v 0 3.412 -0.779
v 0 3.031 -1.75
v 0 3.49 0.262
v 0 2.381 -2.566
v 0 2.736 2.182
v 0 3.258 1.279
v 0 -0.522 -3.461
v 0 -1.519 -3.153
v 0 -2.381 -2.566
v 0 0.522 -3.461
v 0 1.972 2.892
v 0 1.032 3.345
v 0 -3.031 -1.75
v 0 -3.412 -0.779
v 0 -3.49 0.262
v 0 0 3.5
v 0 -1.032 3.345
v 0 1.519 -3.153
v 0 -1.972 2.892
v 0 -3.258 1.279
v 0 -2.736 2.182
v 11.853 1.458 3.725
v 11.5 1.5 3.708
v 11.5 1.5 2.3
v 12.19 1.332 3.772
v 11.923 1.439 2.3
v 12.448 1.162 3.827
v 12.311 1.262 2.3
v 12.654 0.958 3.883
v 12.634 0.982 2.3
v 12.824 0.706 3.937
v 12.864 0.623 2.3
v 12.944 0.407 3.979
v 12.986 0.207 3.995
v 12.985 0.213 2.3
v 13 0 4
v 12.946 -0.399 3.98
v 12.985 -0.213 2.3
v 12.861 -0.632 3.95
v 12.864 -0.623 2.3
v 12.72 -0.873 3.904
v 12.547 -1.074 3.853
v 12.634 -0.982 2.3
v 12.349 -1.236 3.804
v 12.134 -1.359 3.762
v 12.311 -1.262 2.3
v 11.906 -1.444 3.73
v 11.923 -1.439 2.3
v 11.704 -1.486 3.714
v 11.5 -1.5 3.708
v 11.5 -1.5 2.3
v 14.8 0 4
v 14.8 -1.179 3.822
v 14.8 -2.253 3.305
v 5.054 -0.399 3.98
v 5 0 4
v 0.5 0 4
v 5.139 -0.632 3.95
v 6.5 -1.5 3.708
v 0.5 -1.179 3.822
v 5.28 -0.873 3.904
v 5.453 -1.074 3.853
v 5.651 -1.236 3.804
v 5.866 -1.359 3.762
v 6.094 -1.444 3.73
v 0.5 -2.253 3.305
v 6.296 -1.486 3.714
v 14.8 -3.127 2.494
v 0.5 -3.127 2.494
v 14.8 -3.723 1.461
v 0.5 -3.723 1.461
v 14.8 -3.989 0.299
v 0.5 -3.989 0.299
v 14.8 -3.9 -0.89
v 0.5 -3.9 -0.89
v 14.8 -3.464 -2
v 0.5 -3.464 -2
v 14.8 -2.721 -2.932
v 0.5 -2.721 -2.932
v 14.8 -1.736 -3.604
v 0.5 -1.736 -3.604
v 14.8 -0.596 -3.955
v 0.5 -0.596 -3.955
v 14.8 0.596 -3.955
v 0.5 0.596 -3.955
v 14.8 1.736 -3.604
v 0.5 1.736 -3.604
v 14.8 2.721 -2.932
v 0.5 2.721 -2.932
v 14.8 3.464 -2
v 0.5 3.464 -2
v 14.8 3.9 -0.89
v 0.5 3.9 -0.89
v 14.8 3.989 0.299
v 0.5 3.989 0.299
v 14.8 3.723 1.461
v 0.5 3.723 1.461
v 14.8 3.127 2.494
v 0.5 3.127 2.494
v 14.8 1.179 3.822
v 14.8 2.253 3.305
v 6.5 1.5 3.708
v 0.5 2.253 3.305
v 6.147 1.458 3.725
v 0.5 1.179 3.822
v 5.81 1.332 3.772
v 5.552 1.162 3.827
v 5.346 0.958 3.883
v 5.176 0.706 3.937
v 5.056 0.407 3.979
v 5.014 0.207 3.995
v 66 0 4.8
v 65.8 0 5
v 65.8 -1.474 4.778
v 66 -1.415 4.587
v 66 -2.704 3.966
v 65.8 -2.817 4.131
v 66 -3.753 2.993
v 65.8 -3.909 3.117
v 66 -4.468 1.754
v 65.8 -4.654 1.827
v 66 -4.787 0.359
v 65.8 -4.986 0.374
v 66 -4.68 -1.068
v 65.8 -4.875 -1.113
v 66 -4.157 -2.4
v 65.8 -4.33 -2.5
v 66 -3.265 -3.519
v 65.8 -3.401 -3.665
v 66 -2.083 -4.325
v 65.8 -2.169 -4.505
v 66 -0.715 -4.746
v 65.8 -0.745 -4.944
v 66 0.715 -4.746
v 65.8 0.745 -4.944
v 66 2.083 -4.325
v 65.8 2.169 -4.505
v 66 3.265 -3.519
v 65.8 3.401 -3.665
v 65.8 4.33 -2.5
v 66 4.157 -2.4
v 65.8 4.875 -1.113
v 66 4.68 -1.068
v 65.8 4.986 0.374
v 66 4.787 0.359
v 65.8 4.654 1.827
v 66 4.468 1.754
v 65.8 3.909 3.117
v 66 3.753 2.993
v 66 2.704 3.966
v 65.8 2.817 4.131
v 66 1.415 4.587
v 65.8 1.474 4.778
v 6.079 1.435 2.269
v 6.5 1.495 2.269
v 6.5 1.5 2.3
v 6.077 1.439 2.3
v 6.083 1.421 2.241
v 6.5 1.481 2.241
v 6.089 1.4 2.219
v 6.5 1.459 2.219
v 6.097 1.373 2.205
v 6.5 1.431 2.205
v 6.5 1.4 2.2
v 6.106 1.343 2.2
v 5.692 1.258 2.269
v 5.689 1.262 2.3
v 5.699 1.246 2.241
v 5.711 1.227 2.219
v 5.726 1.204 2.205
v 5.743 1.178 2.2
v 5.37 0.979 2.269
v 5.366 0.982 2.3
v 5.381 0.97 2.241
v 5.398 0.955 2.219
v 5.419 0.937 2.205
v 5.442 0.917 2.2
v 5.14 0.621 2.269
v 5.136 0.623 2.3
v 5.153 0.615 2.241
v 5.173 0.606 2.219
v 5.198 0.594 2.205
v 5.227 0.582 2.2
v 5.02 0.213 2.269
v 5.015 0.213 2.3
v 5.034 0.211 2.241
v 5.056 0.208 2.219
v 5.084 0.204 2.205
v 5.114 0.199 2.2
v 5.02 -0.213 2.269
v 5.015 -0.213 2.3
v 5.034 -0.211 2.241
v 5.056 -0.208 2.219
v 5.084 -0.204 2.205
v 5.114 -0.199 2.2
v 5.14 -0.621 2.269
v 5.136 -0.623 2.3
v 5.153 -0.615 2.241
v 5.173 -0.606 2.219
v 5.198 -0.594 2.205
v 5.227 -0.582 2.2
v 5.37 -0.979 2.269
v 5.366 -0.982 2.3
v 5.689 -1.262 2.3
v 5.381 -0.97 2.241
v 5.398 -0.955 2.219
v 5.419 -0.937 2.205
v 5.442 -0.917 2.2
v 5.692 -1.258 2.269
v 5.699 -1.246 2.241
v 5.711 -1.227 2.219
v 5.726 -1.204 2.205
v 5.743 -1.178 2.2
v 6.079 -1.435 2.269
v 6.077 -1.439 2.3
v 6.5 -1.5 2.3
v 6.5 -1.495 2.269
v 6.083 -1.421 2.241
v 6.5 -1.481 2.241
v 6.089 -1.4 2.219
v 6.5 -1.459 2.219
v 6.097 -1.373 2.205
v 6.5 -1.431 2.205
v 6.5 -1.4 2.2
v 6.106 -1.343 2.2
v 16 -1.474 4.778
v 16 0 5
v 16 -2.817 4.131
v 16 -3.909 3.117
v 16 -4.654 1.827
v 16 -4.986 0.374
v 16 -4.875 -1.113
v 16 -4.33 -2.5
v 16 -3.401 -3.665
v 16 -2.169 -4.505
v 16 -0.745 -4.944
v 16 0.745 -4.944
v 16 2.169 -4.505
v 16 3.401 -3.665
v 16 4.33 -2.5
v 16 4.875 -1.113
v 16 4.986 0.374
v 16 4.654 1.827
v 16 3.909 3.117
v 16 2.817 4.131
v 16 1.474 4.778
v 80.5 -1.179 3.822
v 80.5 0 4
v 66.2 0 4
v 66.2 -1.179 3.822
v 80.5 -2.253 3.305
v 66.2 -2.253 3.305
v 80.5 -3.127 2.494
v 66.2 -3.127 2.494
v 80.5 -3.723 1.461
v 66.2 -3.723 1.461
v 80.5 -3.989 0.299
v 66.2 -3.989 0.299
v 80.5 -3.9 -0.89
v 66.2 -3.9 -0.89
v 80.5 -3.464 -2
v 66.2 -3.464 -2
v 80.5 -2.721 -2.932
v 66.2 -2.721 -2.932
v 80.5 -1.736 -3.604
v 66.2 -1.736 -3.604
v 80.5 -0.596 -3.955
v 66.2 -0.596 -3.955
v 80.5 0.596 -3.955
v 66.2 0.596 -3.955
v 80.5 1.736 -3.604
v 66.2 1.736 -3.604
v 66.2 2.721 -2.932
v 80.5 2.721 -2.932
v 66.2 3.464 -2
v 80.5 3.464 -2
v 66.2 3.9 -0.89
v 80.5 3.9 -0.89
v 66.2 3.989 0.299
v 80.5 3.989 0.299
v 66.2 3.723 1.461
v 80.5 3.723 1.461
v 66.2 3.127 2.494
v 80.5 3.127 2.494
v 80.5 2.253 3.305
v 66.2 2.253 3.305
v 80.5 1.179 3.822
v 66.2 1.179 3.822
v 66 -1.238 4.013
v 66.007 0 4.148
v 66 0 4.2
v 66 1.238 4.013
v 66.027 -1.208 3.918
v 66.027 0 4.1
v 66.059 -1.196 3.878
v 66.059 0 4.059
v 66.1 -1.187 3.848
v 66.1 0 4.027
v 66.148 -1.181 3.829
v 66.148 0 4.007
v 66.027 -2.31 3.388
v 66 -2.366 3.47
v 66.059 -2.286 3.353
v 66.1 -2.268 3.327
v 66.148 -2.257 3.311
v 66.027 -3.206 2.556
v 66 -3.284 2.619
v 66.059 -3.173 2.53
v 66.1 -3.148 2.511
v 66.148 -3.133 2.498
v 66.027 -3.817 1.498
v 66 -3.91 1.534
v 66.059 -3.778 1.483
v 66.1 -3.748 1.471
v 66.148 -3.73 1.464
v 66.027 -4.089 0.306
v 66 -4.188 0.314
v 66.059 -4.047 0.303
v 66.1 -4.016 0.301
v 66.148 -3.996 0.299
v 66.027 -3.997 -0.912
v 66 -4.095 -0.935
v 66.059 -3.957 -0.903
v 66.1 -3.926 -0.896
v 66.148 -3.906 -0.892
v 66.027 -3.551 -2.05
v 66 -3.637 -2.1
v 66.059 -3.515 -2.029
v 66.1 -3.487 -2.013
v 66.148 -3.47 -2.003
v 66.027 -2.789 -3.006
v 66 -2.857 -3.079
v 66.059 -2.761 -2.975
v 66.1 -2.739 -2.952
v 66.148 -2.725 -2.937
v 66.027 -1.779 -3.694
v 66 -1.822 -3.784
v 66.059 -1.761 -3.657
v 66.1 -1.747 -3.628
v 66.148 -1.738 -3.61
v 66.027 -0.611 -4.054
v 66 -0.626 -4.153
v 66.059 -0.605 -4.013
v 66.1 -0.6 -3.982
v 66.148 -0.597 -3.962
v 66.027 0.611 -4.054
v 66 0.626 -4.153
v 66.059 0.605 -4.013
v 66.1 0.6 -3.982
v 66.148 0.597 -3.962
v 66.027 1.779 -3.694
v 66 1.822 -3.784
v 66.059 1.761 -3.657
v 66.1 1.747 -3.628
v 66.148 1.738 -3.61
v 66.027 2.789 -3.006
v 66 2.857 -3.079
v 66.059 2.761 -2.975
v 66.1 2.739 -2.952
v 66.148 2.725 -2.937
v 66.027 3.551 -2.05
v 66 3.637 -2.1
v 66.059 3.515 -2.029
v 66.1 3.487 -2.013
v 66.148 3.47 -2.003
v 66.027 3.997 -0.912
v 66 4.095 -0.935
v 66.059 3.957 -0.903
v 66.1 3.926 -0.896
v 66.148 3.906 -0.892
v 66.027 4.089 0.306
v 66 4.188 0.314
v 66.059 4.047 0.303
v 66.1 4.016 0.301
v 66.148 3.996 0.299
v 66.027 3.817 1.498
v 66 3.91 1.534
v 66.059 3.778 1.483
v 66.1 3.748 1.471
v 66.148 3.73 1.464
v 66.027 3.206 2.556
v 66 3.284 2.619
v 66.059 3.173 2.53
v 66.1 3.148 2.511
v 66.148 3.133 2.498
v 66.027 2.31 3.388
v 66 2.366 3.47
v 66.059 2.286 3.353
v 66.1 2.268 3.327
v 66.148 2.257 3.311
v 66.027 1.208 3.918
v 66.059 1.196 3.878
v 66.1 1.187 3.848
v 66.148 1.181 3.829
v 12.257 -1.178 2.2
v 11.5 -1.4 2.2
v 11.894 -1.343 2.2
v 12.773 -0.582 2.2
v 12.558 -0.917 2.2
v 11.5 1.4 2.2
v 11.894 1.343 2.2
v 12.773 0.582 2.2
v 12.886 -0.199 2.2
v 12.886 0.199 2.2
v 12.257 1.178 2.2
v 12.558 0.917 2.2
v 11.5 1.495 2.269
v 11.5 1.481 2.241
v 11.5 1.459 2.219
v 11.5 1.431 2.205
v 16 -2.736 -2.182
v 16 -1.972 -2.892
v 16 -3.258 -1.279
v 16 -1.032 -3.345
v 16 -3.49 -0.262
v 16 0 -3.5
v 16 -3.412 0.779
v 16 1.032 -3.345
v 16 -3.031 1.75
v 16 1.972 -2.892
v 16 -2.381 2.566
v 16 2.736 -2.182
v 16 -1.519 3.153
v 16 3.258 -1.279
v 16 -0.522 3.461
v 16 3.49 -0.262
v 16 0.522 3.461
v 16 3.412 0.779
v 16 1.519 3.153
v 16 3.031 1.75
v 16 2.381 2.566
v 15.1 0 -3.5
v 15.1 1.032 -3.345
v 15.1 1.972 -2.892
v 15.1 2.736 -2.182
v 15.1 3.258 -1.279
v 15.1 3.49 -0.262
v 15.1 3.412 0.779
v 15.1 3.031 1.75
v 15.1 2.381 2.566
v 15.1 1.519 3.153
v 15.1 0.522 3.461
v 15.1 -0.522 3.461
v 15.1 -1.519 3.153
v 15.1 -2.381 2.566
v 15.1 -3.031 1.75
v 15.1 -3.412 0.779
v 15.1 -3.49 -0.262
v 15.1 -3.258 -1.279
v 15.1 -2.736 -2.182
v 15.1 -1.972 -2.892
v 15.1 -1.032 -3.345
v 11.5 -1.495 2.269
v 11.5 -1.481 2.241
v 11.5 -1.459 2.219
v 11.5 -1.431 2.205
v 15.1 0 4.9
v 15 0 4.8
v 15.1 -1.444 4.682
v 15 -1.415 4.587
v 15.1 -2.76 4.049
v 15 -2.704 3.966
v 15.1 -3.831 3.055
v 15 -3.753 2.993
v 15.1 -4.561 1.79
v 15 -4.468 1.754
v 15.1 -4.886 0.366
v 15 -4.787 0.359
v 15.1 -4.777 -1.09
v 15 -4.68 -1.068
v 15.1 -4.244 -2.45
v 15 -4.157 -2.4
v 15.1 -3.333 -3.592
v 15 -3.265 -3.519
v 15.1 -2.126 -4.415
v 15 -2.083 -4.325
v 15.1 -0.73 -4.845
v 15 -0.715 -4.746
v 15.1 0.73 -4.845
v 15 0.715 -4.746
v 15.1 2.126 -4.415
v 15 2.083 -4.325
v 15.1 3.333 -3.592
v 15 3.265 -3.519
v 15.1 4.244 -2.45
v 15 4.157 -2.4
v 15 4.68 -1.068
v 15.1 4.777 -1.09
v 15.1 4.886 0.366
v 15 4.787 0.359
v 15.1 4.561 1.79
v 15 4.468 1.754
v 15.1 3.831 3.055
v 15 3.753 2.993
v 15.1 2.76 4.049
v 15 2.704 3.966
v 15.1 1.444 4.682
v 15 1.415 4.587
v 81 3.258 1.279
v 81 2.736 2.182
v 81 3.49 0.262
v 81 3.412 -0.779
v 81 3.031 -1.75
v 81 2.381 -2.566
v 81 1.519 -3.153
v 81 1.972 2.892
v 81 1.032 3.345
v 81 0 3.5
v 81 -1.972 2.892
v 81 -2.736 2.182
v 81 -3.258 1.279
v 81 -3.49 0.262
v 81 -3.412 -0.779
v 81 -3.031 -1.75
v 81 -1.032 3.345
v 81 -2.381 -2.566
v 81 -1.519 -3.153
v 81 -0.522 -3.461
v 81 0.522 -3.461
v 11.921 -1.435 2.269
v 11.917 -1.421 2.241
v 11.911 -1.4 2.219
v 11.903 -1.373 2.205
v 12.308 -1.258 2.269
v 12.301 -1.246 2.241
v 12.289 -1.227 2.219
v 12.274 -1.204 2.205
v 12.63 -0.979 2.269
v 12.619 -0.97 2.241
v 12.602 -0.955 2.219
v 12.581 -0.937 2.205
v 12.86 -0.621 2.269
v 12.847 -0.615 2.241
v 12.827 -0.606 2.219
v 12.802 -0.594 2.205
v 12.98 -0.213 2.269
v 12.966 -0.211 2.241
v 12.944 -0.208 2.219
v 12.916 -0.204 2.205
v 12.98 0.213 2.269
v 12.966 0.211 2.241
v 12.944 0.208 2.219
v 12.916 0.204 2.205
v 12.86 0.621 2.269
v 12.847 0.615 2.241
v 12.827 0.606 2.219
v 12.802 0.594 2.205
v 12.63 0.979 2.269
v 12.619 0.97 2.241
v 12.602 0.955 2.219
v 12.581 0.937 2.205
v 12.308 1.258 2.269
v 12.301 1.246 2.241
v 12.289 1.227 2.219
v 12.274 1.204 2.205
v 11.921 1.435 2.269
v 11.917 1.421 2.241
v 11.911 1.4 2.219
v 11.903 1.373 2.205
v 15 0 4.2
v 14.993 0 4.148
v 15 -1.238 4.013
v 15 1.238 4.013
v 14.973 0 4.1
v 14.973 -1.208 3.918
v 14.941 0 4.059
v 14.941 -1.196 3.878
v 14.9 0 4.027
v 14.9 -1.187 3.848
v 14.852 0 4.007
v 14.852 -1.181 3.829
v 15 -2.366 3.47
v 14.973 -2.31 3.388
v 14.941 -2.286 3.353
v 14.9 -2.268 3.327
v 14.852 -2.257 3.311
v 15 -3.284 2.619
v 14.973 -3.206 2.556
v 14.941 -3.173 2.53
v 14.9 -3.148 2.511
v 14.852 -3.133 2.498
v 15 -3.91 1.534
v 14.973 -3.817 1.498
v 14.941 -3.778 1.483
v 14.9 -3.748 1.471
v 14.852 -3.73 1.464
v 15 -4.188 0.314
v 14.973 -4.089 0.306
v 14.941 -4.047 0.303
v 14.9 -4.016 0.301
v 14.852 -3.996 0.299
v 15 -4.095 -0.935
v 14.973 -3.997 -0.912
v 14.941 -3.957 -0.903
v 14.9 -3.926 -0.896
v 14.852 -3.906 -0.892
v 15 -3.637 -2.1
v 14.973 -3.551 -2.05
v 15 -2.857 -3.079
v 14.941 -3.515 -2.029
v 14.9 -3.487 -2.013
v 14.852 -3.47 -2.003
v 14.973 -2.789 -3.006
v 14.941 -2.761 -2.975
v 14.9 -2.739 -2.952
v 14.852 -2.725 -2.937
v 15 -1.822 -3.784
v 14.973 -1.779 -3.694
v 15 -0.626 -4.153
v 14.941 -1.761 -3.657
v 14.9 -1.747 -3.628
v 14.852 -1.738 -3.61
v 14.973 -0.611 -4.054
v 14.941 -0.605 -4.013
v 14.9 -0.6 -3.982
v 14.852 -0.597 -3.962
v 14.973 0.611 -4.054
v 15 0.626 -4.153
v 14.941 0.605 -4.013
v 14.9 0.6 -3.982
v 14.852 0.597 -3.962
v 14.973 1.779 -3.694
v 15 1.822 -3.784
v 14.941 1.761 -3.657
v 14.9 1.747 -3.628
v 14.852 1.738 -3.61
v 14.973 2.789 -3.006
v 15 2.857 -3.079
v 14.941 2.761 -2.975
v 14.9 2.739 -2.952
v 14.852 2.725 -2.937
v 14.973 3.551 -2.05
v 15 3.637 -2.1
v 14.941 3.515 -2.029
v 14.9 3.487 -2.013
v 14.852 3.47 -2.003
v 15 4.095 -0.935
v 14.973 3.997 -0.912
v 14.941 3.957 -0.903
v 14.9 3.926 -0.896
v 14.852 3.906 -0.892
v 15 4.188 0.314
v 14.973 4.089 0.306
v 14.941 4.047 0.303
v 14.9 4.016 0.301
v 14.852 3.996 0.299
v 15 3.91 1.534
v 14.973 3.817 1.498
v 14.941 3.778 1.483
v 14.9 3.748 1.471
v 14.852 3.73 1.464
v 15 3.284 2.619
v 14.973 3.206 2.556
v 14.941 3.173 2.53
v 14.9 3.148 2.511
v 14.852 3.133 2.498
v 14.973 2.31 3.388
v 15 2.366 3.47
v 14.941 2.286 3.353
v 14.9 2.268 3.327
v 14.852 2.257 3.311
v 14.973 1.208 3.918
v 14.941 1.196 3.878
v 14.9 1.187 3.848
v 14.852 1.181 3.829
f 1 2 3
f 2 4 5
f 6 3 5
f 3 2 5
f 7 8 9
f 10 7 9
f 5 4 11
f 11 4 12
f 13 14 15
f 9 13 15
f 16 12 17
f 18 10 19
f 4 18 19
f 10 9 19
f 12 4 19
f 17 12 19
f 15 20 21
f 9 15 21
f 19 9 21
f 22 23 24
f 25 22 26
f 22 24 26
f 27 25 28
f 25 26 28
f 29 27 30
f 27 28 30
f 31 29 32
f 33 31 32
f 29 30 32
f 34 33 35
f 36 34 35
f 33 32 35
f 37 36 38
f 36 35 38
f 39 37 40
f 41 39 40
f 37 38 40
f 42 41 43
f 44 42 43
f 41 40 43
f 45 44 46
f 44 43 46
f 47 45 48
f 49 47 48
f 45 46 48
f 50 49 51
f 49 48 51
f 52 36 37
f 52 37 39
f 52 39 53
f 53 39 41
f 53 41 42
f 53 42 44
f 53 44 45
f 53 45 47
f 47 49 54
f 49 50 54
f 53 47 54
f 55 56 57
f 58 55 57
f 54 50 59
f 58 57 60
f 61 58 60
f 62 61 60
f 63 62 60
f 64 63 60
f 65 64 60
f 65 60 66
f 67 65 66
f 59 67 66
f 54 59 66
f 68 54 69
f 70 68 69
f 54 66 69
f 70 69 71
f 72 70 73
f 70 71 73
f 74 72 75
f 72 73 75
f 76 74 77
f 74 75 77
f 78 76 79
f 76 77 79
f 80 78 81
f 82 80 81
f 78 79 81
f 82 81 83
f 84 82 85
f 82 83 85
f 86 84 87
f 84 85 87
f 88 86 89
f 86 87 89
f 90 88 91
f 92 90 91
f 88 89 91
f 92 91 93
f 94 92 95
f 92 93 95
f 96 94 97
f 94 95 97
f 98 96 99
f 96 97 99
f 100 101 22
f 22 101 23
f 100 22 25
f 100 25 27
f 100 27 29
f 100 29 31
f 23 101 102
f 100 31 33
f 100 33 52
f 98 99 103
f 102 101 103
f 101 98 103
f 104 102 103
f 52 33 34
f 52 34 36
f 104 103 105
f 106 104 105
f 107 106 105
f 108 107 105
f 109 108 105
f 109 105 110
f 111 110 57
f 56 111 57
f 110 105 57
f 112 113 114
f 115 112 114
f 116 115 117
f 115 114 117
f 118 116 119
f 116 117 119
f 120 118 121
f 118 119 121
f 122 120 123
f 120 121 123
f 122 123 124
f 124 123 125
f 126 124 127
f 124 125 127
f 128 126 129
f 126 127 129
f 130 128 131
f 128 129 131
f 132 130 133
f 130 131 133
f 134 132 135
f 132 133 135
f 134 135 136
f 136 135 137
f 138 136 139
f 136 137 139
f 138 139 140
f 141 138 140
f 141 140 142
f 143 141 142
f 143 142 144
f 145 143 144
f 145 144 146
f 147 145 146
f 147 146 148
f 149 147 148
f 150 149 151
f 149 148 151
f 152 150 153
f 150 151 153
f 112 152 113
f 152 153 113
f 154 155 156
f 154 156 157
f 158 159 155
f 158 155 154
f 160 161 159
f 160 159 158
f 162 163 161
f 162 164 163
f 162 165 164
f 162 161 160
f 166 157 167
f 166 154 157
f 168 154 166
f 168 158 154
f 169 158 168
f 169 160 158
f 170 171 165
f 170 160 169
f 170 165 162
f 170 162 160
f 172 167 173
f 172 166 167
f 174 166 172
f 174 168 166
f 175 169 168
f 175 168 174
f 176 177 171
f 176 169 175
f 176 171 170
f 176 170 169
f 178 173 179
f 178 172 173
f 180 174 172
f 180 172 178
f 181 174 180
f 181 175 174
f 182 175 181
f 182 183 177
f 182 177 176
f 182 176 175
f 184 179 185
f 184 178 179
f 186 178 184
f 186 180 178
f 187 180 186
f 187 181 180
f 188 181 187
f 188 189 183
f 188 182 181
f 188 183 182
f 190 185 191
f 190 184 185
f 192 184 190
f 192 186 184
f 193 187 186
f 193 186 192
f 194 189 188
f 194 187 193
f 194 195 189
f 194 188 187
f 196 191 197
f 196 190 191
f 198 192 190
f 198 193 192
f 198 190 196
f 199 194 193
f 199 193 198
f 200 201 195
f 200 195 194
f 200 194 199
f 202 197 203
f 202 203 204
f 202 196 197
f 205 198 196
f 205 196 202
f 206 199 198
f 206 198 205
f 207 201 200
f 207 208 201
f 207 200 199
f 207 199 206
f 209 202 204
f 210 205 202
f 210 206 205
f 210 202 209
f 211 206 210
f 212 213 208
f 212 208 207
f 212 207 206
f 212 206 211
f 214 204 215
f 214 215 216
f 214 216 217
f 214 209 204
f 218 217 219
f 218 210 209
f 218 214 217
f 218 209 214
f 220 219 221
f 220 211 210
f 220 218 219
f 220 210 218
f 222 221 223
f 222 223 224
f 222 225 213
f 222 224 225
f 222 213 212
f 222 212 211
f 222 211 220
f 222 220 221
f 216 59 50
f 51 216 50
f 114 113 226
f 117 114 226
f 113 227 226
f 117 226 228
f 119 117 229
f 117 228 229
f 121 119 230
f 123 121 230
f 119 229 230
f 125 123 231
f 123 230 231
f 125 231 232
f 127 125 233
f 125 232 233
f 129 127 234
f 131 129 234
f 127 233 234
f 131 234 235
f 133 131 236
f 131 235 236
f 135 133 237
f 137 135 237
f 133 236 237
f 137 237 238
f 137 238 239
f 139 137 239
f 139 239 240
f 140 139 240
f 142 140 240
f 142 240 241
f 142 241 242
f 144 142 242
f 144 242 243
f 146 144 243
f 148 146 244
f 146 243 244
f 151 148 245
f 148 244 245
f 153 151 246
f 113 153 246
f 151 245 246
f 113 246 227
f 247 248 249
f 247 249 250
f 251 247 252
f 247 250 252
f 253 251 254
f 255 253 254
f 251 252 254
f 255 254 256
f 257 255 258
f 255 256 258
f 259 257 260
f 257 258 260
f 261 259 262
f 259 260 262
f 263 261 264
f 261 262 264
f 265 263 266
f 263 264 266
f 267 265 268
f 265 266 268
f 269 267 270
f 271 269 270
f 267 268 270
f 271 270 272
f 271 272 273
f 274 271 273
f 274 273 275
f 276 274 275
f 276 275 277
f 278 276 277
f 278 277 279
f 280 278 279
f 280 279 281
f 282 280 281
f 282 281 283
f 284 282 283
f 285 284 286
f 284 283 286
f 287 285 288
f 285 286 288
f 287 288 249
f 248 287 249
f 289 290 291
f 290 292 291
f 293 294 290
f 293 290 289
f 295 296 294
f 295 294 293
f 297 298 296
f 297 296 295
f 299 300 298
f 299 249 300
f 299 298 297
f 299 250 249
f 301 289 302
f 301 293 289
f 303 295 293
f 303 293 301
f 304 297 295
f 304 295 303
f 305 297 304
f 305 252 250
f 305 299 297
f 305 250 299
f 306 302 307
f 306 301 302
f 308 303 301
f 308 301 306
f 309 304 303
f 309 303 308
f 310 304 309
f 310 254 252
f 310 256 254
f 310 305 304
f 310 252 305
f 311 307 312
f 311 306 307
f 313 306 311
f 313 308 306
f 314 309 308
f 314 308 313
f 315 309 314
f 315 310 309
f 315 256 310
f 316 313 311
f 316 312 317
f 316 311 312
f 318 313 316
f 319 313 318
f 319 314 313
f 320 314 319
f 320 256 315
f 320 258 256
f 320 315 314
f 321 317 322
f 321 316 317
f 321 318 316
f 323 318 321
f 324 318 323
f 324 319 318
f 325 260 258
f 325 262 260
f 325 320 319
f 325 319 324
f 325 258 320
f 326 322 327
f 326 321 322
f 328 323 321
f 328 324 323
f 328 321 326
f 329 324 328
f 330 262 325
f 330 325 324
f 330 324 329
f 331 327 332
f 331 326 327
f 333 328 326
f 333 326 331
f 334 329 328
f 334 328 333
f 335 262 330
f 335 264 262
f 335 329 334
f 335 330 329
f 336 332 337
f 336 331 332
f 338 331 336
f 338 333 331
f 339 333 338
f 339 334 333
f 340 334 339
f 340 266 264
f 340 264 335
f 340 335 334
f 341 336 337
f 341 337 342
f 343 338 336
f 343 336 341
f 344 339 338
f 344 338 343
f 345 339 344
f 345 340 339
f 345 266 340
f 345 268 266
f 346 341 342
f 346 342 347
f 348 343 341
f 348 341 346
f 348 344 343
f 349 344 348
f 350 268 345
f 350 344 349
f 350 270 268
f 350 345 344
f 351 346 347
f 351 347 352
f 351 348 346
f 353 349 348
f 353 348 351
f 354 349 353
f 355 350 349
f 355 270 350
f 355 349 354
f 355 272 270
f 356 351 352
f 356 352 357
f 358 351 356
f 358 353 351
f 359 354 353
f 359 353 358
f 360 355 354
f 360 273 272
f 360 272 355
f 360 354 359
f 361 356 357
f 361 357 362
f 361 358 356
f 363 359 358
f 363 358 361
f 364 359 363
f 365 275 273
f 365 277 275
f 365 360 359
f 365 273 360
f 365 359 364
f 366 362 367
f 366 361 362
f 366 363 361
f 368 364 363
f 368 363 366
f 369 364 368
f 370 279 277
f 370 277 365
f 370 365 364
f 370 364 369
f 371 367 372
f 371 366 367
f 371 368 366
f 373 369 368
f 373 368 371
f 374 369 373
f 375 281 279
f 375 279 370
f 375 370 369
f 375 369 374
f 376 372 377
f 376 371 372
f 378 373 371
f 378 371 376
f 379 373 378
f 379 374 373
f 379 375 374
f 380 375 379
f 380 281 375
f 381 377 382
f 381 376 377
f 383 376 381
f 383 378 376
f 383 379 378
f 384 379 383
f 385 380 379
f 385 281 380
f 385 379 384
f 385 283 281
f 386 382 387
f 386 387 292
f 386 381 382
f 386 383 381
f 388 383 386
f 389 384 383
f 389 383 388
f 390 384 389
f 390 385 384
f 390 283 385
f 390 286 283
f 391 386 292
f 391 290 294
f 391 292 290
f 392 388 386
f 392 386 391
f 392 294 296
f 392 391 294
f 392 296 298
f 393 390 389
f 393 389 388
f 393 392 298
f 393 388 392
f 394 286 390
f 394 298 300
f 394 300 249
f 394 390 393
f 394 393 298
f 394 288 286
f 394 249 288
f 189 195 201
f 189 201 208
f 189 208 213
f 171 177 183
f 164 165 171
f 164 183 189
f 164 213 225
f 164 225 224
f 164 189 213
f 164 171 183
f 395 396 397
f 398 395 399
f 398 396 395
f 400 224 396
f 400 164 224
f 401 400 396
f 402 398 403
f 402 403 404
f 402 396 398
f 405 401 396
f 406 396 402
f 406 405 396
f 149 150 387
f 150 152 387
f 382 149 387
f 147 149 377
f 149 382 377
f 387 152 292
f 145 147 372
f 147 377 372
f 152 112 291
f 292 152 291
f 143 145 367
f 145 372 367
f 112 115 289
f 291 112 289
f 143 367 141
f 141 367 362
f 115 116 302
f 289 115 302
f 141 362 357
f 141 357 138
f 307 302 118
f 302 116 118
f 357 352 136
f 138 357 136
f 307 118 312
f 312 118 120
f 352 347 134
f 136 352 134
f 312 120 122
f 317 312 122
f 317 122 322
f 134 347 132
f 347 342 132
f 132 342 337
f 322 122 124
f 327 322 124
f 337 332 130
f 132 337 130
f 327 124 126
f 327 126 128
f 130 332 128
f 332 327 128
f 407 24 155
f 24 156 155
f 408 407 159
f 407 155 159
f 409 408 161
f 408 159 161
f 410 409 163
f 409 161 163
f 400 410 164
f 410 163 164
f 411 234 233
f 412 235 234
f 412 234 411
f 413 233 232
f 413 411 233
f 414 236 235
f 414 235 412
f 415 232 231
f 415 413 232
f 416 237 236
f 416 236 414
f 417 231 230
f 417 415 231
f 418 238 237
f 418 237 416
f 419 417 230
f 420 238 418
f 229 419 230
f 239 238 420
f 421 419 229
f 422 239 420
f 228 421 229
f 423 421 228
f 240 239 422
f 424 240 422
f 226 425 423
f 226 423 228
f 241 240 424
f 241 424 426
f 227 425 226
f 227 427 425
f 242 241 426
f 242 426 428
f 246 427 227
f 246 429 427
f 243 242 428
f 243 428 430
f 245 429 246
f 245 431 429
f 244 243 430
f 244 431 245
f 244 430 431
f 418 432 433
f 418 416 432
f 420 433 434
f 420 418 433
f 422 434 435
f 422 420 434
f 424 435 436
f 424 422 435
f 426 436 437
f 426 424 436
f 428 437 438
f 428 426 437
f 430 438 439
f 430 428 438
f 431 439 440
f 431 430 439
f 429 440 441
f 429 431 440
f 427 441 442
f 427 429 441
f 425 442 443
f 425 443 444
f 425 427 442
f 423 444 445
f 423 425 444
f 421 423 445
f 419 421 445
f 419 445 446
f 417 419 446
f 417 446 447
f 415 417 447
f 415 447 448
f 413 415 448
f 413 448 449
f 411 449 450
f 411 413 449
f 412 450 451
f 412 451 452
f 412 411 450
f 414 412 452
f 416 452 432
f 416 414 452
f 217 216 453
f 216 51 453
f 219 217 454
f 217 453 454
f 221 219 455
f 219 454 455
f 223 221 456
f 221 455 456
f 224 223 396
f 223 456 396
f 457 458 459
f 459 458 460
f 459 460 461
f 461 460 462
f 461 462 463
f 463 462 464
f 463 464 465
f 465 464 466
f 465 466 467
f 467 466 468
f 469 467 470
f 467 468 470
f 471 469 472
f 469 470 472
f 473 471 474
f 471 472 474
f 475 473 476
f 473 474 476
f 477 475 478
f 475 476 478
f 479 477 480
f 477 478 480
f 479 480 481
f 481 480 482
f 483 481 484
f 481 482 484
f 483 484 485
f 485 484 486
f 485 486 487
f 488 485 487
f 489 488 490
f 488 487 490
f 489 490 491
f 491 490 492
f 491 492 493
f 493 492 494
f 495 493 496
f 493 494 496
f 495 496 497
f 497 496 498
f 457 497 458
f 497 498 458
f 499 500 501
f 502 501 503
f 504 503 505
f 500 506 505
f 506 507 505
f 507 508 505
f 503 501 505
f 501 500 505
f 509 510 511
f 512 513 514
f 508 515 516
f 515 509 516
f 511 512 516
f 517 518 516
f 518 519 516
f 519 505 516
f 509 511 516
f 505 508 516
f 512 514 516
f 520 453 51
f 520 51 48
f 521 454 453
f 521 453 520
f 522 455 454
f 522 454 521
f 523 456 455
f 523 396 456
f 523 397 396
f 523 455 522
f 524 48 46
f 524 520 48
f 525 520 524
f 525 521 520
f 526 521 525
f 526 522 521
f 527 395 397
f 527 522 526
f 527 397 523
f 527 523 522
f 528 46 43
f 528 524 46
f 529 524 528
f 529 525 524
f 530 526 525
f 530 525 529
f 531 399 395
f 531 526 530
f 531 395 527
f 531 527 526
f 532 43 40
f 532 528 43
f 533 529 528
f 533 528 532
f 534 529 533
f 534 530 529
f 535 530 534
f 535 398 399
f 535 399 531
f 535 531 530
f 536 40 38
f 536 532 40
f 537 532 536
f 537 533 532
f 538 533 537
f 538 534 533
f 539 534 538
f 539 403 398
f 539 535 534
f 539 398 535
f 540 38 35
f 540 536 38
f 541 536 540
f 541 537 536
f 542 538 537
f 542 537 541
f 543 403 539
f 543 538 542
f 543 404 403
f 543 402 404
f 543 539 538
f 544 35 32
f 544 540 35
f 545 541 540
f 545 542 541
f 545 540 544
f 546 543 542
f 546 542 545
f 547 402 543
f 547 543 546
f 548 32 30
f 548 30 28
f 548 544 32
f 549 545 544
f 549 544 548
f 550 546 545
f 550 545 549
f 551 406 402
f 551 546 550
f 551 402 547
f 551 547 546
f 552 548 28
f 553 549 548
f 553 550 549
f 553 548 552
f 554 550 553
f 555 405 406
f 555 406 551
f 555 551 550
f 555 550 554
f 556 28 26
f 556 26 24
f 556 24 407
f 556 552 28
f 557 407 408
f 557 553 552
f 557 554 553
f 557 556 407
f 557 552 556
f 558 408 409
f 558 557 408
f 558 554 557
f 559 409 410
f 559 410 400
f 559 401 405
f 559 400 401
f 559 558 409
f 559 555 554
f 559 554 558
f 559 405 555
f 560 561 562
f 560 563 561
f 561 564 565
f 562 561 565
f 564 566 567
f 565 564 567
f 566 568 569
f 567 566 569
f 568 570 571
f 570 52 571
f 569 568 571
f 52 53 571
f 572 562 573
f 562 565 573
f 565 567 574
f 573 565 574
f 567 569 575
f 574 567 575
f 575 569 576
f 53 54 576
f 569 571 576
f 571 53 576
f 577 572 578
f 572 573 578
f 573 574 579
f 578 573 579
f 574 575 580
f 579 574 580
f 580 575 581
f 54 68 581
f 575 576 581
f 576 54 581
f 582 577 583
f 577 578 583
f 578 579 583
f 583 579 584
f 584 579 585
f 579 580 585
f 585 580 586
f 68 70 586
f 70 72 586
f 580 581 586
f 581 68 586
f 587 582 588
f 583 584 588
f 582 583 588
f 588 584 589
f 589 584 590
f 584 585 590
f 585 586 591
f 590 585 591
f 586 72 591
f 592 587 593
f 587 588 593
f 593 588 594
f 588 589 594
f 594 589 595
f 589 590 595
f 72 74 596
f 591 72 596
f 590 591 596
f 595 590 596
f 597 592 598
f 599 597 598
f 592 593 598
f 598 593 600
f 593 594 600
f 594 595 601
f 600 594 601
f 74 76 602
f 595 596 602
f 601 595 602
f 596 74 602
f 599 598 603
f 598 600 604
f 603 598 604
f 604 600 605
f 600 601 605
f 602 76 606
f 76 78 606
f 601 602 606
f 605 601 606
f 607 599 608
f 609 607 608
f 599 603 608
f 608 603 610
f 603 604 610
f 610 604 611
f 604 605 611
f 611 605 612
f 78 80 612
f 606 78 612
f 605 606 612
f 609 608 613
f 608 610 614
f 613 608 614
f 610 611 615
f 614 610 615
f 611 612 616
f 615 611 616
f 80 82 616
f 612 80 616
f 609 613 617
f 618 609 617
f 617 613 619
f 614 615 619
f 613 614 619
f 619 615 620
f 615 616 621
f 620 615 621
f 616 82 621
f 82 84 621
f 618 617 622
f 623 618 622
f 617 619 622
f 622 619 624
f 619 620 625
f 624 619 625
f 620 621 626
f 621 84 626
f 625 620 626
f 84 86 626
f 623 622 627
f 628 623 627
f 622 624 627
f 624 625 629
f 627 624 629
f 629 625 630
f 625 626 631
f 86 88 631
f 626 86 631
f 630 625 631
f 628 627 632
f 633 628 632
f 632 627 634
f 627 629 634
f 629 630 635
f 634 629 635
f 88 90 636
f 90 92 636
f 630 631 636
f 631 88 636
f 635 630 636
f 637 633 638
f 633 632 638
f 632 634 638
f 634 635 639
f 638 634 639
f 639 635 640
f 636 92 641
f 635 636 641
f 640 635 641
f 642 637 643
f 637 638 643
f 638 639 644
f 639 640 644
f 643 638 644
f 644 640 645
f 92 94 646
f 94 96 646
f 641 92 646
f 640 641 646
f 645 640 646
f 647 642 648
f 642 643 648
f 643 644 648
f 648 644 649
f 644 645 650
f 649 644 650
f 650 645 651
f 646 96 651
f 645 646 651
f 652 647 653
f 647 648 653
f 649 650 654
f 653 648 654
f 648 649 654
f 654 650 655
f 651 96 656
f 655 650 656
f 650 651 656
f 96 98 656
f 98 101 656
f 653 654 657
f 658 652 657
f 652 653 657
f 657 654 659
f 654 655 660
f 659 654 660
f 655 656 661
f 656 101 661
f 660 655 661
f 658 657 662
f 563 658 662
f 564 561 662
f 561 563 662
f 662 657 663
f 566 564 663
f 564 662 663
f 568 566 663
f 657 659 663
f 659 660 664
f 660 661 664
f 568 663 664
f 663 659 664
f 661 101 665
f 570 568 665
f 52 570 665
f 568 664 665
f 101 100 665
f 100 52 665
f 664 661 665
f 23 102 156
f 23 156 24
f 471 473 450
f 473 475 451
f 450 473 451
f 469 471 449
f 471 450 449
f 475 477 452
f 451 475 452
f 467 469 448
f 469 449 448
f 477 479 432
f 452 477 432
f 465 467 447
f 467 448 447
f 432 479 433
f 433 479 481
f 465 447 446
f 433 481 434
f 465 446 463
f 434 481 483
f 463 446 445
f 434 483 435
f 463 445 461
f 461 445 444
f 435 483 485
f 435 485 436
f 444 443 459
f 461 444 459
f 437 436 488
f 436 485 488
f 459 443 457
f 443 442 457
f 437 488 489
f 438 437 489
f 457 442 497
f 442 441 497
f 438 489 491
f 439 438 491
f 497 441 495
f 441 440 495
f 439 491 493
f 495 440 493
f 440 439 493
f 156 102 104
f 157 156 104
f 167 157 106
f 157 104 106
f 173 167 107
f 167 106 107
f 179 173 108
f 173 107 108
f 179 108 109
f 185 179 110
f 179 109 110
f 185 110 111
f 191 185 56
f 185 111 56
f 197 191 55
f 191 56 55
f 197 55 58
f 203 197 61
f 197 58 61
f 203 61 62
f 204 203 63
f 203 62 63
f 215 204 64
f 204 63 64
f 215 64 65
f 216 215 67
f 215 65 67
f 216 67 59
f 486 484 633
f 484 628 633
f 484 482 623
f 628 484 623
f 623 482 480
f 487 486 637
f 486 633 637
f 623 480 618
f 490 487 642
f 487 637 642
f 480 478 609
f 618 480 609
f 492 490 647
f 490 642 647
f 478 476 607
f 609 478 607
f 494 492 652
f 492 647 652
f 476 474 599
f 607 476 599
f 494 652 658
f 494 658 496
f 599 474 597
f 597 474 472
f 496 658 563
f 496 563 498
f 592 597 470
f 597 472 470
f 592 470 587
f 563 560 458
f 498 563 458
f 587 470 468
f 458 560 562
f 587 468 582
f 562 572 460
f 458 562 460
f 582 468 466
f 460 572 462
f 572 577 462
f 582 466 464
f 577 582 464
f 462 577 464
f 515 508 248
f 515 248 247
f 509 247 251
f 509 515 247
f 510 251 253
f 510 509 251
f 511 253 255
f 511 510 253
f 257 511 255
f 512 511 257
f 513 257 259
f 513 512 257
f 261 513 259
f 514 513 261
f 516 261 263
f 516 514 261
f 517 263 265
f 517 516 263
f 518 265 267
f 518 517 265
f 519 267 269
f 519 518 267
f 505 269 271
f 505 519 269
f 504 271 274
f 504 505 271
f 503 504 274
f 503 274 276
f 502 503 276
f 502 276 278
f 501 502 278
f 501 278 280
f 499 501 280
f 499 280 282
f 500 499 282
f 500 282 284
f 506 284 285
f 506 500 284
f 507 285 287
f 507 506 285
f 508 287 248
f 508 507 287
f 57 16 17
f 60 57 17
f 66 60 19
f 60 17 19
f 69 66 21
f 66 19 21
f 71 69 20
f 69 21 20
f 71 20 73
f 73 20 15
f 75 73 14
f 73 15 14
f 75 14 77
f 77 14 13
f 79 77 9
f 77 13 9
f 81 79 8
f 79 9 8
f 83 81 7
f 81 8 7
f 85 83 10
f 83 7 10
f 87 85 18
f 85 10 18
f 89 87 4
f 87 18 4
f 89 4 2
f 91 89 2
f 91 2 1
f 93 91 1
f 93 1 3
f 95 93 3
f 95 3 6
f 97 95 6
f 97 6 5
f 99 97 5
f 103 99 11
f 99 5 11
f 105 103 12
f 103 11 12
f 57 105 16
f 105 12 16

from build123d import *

# Parameters (mm, degrees)
CHAMFER1_SIZE        = 0.2
CHAMFER2_SIZE        = 0.2
CHAMFER3_SIZE        = 0.5
CHAMFER4_SIZE        = 0.5
FILLET1_R            = 0.2
FILLET2_R            = 0.2
SKETCH11_W           = 8
SKETCH11_H           = 3
BOSS_EXTRUDE10_DEPTH = 1.8
FILLET19_RADIUS      = 1.5
FILLET19_LENGTH      = 1.8
FILLET20_RADIUS      = 1.5
FILLET20_LENGTH      = 1.8
FILLET21_R           = 0.1
SKETCH21_W           = 0.9
SKETCH21_H           = 1.5


with BuildPart() as part:
    # Sketch1 → Revolve1 (revolve)
    with BuildSketch(Plane.XY, mode=Mode.PRIVATE) as revolve1_sk:
        Polygon((0, 0), (81, 0), (81, 4), (66, 4), (66, 5), (15, 5), (15, 4), (0, 4), align=None)
    revolve(revolve1_sk.sketch.rotate(Axis((0, 0, 0), (1, 0, 0)), 90), axis=Axis((0, 0, 0), (1, 0, 0)))

    # Chamfer1
    chamfer1_edges = [part.edges().sort_by_distance(p)[0] for p in [
        (66, 0, -5),
    ]]
    chamfer(chamfer1_edges, length=CHAMFER1_SIZE)

    # Chamfer2
    chamfer2_edges = [part.edges().sort_by_distance(p)[0] for p in [
        (15, 0, -5),
    ]]
    chamfer(chamfer2_edges, length=CHAMFER2_SIZE)

    # Chamfer3
    chamfer3_edges = [part.edges().sort_by_distance(p)[0] for p in [
        (0, 0, -4),
    ]]
    chamfer(chamfer3_edges, length=CHAMFER3_SIZE)

    # Chamfer4
    chamfer4_edges = [part.edges().sort_by_distance(p)[0] for p in [
        (81, 0, -4),
    ]]
    chamfer(chamfer4_edges, length=CHAMFER4_SIZE)

    # Fillet1
    fillet1_edges = [part.edges().sort_by_distance(p)[0] for p in [
        (15, 0, -4),
    ]]
    fillet(fillet1_edges, radius=FILLET1_R)

    # Fillet2
    fillet2_edges = [part.edges().sort_by_distance(p)[0] for p in [
        (66, 0, -4),
    ]]
    fillet(fillet2_edges, radius=FILLET2_R)


with BuildPart() as body_2:
    # Sketch11 → Boss-Extrude10 (new body)
    with BuildSketch(Plane.XY.offset(4)):
        with Locations((9, 0)):
            Rectangle(SKETCH11_W, SKETCH11_H)
    extrude(amount=-BOSS_EXTRUDE10_DEPTH)

    # Fillet19: full round fillet: the end face becomes a half cylinder, R = half its width
    fillet19_face = Plane((5, 0, 3.1), x_dir=(0, 0, 1), z_dir=(-1, 0, 0))  # on the end face: x along it, z out of the body
    fillet19_slab = fillet19_face.offset(-FILLET19_RADIUS / 2) * Box(FILLET19_LENGTH, 2 * FILLET19_RADIUS, FILLET19_RADIUS, mode=Mode.PRIVATE)  # the body's end, R deep
    fillet19_round = Plane((6.5, 0, 3.1), x_dir=(-1, 0, 0), z_dir=(0, 0, 1)) * Cylinder(FILLET19_RADIUS, FILLET19_LENGTH, mode=Mode.PRIVATE)  # its axis R under the face
    add(fillet19_slab - fillet19_round, mode=Mode.SUBTRACT)

    # Fillet20: full round fillet: the end face becomes a half cylinder, R = half its width
    fillet20_face = Plane((13, 0, 3.1), x_dir=(0, 0, -1), z_dir=(1, 0, 0))  # on the end face: x along it, z out of the body
    fillet20_slab = fillet20_face.offset(-FILLET20_RADIUS / 2) * Box(FILLET20_LENGTH, 2 * FILLET20_RADIUS, FILLET20_RADIUS, mode=Mode.PRIVATE)  # the body's end, R deep
    fillet20_round = Plane((11.5, 0, 3.1), x_dir=(1, 0, 0), z_dir=(0, 0, -1)) * Cylinder(FILLET20_RADIUS, FILLET20_LENGTH, mode=Mode.PRIVATE)  # its axis R under the face
    add(fillet20_slab - fillet20_round, mode=Mode.SUBTRACT)

    # Fillet21
    fillet21_edges = [body_2.edges().sort_by_distance(p)[0] for p in [
        (9, -1.5, 2.2),
        (5, 0, 2.2),
        (9, 1.5, 2.2),
        (13, 0, 2.2),
    ]]
    fillet(fillet21_edges, radius=FILLET21_R)


with BuildPart() as part_1:
    add(part.part)

    # Combine6: cut body 2
    add(body_2.part, mode=Mode.SUBTRACT)

    # Sketch21 → Cut-Revolve3 (revolve, cut)
    with BuildSketch(Plane.XY, mode=Mode.PRIVATE) as cut_revolve3_sk:
        with Locations((15.55, 4.25)):
            Rectangle(SKETCH21_W, SKETCH21_H)
    revolve(cut_revolve3_sk.sketch.rotate(Axis((0, 0, 0), (1, 0, 0)), 270), axis=Axis((0, 0, 0), (1, 0, 0)), mode=Mode.SUBTRACT)


solid = part_1.part
